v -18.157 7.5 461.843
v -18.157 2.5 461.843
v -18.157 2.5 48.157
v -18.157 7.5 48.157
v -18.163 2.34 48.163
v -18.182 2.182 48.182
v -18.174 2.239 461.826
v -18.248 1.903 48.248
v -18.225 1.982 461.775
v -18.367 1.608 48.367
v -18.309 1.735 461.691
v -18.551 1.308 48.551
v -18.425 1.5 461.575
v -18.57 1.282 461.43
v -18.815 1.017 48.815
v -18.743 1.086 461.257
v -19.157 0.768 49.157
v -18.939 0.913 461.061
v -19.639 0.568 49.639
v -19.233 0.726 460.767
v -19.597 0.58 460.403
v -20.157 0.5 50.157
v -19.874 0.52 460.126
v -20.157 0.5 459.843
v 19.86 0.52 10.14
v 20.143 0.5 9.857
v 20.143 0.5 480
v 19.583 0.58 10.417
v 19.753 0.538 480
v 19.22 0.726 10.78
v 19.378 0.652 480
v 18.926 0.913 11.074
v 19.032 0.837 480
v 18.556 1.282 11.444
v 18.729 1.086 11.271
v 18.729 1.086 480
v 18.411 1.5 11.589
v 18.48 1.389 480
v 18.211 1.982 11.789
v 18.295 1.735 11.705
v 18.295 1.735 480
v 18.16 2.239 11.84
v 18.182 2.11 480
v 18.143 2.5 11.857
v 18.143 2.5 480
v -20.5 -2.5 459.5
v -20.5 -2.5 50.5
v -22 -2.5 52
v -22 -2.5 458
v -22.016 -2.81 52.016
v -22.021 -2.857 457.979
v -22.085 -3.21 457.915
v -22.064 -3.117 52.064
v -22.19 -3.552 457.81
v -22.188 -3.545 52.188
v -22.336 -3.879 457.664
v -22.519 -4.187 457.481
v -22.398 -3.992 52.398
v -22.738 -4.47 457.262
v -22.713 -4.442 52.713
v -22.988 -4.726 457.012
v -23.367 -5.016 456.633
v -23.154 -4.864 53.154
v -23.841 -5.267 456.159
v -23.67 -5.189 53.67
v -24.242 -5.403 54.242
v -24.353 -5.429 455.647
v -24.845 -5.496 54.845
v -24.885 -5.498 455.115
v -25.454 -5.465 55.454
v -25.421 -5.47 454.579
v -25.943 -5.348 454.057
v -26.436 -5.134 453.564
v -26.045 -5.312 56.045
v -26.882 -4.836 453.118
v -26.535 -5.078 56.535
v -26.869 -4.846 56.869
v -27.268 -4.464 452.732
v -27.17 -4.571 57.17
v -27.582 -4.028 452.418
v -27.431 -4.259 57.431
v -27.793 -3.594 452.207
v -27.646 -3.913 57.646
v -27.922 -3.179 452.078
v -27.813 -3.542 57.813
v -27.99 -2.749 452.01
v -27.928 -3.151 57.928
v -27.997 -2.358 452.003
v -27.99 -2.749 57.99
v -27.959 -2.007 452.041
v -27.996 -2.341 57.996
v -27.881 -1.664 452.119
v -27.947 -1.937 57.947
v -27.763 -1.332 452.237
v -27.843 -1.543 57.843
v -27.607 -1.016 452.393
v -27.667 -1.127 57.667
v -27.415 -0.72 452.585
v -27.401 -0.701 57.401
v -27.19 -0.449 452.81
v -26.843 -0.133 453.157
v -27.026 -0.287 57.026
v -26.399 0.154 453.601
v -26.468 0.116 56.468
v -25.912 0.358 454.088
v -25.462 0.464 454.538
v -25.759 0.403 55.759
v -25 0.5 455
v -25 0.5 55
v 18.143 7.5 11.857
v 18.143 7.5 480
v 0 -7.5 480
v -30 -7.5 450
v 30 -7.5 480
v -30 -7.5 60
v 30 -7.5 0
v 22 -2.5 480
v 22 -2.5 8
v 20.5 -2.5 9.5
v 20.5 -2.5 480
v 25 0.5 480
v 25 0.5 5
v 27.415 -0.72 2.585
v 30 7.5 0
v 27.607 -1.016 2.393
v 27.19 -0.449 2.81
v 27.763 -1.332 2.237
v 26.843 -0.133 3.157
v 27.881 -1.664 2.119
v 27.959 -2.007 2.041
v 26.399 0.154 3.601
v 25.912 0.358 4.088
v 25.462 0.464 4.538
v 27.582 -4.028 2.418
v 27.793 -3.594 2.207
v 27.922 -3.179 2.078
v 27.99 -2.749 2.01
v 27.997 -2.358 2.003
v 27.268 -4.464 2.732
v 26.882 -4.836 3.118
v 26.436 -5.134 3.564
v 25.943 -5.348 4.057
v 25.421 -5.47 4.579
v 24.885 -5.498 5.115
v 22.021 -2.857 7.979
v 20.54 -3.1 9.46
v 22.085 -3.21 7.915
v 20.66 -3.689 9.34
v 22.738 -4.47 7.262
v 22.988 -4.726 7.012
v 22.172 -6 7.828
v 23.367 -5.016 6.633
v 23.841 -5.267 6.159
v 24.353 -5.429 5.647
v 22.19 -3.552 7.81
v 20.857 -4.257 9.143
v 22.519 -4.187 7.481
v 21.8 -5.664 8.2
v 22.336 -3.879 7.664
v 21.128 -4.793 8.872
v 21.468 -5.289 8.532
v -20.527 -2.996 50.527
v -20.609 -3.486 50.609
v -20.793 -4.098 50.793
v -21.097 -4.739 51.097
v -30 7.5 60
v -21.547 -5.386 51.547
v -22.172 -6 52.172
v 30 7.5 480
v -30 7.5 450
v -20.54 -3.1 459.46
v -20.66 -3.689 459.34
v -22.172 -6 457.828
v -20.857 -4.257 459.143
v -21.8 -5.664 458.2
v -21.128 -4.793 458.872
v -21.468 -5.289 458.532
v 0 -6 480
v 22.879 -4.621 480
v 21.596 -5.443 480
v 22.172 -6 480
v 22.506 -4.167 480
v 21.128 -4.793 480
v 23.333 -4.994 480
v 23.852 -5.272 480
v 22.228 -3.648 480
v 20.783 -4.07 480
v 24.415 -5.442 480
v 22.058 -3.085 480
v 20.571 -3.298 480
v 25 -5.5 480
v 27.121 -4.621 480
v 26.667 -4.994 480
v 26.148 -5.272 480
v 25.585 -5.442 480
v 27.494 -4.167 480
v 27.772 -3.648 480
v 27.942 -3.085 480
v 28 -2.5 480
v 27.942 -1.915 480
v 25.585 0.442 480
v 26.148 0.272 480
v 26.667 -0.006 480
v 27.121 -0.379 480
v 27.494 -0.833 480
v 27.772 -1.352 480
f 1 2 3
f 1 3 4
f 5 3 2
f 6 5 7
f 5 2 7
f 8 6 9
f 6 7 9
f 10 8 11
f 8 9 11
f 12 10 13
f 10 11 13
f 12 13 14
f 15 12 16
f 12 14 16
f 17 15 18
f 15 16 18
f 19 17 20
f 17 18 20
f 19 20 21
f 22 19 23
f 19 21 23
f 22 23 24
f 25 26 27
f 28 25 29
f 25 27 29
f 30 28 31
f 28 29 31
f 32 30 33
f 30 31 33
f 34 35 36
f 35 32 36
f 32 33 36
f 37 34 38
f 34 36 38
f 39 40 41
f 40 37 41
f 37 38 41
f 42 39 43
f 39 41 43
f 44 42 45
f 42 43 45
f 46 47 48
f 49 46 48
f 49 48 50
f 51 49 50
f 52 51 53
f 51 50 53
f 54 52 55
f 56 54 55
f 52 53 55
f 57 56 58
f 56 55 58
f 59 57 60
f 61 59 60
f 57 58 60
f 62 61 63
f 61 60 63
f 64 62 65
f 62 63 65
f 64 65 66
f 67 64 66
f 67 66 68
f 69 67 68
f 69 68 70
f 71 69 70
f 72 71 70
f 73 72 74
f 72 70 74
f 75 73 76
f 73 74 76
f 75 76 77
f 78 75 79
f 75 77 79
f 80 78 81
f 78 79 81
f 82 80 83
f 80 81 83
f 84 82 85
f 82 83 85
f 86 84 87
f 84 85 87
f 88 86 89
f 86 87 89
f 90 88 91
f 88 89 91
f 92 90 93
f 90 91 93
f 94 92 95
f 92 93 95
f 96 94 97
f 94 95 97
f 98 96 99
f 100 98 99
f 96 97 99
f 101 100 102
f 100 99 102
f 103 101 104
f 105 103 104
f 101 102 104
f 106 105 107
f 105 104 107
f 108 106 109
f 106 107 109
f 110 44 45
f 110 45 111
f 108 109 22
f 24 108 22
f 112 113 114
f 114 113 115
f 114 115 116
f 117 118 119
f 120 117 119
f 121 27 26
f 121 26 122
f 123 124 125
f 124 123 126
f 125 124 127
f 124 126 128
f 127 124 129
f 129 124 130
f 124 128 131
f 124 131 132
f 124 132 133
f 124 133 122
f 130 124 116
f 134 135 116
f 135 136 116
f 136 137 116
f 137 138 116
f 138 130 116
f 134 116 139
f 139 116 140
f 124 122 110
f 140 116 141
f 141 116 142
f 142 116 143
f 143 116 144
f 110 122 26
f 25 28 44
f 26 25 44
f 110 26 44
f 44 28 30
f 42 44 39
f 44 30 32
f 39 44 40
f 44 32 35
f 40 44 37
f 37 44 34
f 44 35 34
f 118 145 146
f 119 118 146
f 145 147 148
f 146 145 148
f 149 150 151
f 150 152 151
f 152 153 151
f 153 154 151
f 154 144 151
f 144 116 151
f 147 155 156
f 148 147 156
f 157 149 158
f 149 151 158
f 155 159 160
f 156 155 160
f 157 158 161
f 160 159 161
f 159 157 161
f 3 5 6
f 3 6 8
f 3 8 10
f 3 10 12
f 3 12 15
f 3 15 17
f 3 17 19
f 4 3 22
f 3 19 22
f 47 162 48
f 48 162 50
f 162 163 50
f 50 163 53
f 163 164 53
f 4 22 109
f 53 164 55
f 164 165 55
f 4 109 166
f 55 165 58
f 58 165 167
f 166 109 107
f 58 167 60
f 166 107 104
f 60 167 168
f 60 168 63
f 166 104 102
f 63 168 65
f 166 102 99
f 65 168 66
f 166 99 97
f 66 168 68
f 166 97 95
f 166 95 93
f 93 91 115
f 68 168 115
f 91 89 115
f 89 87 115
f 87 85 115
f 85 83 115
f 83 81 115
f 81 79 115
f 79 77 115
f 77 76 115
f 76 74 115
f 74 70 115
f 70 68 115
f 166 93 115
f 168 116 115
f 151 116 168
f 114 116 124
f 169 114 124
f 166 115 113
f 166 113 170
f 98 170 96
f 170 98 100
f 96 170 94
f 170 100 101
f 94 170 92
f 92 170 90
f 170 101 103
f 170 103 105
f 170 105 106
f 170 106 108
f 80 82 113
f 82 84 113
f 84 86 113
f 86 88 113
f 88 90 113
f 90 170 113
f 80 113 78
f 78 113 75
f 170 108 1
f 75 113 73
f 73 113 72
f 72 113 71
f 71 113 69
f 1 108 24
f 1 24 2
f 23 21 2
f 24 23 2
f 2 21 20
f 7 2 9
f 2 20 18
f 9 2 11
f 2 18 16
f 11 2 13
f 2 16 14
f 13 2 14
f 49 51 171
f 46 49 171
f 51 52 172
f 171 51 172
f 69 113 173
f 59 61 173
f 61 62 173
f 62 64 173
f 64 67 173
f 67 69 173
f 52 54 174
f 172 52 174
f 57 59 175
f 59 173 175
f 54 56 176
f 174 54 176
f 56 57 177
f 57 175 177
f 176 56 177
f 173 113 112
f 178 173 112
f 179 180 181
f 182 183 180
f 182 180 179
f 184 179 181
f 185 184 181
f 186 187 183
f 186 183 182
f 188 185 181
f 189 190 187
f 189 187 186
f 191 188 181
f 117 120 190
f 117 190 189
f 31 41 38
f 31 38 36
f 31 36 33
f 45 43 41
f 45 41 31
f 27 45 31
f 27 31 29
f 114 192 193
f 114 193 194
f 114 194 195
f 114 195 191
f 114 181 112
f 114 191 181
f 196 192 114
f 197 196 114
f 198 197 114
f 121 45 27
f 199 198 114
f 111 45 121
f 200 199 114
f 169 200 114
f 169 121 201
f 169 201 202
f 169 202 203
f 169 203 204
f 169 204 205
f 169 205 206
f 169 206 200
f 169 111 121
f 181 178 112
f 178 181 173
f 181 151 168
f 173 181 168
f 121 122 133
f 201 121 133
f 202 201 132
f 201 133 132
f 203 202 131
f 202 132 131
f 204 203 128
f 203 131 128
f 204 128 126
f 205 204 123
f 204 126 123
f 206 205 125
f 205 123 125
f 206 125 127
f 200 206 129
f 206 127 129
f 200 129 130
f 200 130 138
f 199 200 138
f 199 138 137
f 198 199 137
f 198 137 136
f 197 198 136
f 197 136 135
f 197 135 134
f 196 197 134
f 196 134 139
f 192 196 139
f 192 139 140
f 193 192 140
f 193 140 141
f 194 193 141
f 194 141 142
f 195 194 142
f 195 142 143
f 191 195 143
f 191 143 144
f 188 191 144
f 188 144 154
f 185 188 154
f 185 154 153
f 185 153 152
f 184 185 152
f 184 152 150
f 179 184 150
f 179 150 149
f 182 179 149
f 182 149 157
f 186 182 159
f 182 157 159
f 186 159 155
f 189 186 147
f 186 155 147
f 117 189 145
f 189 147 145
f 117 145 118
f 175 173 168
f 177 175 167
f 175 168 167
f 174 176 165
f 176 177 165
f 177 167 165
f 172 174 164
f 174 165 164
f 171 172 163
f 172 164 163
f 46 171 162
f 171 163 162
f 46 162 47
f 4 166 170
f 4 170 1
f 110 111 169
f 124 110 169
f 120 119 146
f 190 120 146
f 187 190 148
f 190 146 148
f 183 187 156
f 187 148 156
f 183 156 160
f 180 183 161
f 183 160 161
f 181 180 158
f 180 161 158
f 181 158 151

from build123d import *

# Parameters (mm, degrees)
SKETCH_1_W               = 60
SKETCH_1_H               = 15
EXTRUDE_1_DEPTH          = 510
SKETCH_2_R               = 3
CUT_EXTRUDE_1_DEPTH      = 511.936639908
CUT_EXTRUDE_2_DEPTH      = 511.936639908
SKETCH_4_W               = 36.3
SKETCH_4_H               = 7
CUT_EXTRUDE_3_DEPTH      = 511.936639908
FILLET_1_R               = 2
CUT_EXTRUDE_4_DEPTH      = 512.101751122
CUT_EXTRUDE_6_DEPTH      = 512.101751122
CUT_EXTRUDE_6_DEPTH_BACK = 512.101751122
SKETCH_7_W               = 30
SKETCH_7_H               = 30


with BuildPart() as part:
    # 스케치1 → 보스-돌출1 (new body)
    with BuildSketch(Plane.XY):
        Rectangle(SKETCH_1_W, SKETCH_1_H)
    extrude(amount=EXTRUDE_1_DEPTH)

    # 스케치2 → 컷-돌출1 (cut, through all)
    with BuildSketch(Plane(origin=(0, 0, 0), x_dir=(-1, 0, 0), z_dir=(0, 0, -1))):
        with Locations((-25, -2.5)):
            Circle(SKETCH_2_R)
        with Locations((25, -2.5)):
            Circle(SKETCH_2_R)
    extrude(amount=-CUT_EXTRUDE_1_DEPTH, mode=Mode.SUBTRACT)

    # 스케치3 → 컷-돌출2 (cut, through all)
    with BuildSketch(Plane(origin=(0, 0, 0), x_dir=(-1, 0, 0), z_dir=(0, 0, -1))):
        with BuildLine():
            Line((-22.171572875, -6), (22.171572875, -6))
            ThreePointArc((22.171572875, -6), (20.939339828, -4.439339828), (20.5, -2.5))
            Line((20.5, -2.5), (25, -2.5))
            Line((25, -2.5), (25, 0.5))
            Line((25, 0.5), (-25, 0.5))
            Line((-25, 0.5), (-25, -2.5))
            Line((-25, -2.5), (-20.5, -2.5))
            ThreePointArc((-20.5, -2.5), (-20.939339828, -4.439339828), (-22.171572875, -6))
        make_face()
    extrude(amount=-CUT_EXTRUDE_2_DEPTH, mode=Mode.SUBTRACT)

    # 스케치4 → 컷-돌출3 (cut, through all)
    with BuildSketch(Plane(origin=(0, 0, 0), x_dir=(-1, 0, 0), z_dir=(0, 0, -1))):
        with Locations((0.006888359, 4)):
            Rectangle(SKETCH_4_W, SKETCH_4_H)
    extrude(amount=-CUT_EXTRUDE_3_DEPTH, mode=Mode.SUBTRACT)

    # 필렛1
    fillet_1_edges = [part.edges().sort_by_distance(p)[0] for p in [
        (-18.156888359, 0.5, 255),
        (18.143111641, 0.5, 255),
    ]]
    fillet(fillet_1_edges, radius=FILLET_1_R)

    # 스케치5 → 컷-돌출4 (cut, through all)
    with BuildSketch(Plane.XZ.offset(7.5)):
        Polygon((-30, 510), (-30, 450), (30, 510), align=None)
        Polygon((-30, 0), (30, 0), (-30, 60), align=None)
    extrude(amount=-CUT_EXTRUDE_4_DEPTH, mode=Mode.SUBTRACT)

    # 스케치7 → 컷-돌출6 (cut, two sides: drawn at the far end of the back side and taken through both)
    with BuildSketch(Plane.XZ.offset(7.5).offset(-CUT_EXTRUDE_6_DEPTH_BACK)):
        with Locations((15, 495)):
            Rectangle(SKETCH_7_W, SKETCH_7_H)
    extrude(amount=CUT_EXTRUDE_6_DEPTH + CUT_EXTRUDE_6_DEPTH_BACK, mode=Mode.SUBTRACT)


solid = part.part
